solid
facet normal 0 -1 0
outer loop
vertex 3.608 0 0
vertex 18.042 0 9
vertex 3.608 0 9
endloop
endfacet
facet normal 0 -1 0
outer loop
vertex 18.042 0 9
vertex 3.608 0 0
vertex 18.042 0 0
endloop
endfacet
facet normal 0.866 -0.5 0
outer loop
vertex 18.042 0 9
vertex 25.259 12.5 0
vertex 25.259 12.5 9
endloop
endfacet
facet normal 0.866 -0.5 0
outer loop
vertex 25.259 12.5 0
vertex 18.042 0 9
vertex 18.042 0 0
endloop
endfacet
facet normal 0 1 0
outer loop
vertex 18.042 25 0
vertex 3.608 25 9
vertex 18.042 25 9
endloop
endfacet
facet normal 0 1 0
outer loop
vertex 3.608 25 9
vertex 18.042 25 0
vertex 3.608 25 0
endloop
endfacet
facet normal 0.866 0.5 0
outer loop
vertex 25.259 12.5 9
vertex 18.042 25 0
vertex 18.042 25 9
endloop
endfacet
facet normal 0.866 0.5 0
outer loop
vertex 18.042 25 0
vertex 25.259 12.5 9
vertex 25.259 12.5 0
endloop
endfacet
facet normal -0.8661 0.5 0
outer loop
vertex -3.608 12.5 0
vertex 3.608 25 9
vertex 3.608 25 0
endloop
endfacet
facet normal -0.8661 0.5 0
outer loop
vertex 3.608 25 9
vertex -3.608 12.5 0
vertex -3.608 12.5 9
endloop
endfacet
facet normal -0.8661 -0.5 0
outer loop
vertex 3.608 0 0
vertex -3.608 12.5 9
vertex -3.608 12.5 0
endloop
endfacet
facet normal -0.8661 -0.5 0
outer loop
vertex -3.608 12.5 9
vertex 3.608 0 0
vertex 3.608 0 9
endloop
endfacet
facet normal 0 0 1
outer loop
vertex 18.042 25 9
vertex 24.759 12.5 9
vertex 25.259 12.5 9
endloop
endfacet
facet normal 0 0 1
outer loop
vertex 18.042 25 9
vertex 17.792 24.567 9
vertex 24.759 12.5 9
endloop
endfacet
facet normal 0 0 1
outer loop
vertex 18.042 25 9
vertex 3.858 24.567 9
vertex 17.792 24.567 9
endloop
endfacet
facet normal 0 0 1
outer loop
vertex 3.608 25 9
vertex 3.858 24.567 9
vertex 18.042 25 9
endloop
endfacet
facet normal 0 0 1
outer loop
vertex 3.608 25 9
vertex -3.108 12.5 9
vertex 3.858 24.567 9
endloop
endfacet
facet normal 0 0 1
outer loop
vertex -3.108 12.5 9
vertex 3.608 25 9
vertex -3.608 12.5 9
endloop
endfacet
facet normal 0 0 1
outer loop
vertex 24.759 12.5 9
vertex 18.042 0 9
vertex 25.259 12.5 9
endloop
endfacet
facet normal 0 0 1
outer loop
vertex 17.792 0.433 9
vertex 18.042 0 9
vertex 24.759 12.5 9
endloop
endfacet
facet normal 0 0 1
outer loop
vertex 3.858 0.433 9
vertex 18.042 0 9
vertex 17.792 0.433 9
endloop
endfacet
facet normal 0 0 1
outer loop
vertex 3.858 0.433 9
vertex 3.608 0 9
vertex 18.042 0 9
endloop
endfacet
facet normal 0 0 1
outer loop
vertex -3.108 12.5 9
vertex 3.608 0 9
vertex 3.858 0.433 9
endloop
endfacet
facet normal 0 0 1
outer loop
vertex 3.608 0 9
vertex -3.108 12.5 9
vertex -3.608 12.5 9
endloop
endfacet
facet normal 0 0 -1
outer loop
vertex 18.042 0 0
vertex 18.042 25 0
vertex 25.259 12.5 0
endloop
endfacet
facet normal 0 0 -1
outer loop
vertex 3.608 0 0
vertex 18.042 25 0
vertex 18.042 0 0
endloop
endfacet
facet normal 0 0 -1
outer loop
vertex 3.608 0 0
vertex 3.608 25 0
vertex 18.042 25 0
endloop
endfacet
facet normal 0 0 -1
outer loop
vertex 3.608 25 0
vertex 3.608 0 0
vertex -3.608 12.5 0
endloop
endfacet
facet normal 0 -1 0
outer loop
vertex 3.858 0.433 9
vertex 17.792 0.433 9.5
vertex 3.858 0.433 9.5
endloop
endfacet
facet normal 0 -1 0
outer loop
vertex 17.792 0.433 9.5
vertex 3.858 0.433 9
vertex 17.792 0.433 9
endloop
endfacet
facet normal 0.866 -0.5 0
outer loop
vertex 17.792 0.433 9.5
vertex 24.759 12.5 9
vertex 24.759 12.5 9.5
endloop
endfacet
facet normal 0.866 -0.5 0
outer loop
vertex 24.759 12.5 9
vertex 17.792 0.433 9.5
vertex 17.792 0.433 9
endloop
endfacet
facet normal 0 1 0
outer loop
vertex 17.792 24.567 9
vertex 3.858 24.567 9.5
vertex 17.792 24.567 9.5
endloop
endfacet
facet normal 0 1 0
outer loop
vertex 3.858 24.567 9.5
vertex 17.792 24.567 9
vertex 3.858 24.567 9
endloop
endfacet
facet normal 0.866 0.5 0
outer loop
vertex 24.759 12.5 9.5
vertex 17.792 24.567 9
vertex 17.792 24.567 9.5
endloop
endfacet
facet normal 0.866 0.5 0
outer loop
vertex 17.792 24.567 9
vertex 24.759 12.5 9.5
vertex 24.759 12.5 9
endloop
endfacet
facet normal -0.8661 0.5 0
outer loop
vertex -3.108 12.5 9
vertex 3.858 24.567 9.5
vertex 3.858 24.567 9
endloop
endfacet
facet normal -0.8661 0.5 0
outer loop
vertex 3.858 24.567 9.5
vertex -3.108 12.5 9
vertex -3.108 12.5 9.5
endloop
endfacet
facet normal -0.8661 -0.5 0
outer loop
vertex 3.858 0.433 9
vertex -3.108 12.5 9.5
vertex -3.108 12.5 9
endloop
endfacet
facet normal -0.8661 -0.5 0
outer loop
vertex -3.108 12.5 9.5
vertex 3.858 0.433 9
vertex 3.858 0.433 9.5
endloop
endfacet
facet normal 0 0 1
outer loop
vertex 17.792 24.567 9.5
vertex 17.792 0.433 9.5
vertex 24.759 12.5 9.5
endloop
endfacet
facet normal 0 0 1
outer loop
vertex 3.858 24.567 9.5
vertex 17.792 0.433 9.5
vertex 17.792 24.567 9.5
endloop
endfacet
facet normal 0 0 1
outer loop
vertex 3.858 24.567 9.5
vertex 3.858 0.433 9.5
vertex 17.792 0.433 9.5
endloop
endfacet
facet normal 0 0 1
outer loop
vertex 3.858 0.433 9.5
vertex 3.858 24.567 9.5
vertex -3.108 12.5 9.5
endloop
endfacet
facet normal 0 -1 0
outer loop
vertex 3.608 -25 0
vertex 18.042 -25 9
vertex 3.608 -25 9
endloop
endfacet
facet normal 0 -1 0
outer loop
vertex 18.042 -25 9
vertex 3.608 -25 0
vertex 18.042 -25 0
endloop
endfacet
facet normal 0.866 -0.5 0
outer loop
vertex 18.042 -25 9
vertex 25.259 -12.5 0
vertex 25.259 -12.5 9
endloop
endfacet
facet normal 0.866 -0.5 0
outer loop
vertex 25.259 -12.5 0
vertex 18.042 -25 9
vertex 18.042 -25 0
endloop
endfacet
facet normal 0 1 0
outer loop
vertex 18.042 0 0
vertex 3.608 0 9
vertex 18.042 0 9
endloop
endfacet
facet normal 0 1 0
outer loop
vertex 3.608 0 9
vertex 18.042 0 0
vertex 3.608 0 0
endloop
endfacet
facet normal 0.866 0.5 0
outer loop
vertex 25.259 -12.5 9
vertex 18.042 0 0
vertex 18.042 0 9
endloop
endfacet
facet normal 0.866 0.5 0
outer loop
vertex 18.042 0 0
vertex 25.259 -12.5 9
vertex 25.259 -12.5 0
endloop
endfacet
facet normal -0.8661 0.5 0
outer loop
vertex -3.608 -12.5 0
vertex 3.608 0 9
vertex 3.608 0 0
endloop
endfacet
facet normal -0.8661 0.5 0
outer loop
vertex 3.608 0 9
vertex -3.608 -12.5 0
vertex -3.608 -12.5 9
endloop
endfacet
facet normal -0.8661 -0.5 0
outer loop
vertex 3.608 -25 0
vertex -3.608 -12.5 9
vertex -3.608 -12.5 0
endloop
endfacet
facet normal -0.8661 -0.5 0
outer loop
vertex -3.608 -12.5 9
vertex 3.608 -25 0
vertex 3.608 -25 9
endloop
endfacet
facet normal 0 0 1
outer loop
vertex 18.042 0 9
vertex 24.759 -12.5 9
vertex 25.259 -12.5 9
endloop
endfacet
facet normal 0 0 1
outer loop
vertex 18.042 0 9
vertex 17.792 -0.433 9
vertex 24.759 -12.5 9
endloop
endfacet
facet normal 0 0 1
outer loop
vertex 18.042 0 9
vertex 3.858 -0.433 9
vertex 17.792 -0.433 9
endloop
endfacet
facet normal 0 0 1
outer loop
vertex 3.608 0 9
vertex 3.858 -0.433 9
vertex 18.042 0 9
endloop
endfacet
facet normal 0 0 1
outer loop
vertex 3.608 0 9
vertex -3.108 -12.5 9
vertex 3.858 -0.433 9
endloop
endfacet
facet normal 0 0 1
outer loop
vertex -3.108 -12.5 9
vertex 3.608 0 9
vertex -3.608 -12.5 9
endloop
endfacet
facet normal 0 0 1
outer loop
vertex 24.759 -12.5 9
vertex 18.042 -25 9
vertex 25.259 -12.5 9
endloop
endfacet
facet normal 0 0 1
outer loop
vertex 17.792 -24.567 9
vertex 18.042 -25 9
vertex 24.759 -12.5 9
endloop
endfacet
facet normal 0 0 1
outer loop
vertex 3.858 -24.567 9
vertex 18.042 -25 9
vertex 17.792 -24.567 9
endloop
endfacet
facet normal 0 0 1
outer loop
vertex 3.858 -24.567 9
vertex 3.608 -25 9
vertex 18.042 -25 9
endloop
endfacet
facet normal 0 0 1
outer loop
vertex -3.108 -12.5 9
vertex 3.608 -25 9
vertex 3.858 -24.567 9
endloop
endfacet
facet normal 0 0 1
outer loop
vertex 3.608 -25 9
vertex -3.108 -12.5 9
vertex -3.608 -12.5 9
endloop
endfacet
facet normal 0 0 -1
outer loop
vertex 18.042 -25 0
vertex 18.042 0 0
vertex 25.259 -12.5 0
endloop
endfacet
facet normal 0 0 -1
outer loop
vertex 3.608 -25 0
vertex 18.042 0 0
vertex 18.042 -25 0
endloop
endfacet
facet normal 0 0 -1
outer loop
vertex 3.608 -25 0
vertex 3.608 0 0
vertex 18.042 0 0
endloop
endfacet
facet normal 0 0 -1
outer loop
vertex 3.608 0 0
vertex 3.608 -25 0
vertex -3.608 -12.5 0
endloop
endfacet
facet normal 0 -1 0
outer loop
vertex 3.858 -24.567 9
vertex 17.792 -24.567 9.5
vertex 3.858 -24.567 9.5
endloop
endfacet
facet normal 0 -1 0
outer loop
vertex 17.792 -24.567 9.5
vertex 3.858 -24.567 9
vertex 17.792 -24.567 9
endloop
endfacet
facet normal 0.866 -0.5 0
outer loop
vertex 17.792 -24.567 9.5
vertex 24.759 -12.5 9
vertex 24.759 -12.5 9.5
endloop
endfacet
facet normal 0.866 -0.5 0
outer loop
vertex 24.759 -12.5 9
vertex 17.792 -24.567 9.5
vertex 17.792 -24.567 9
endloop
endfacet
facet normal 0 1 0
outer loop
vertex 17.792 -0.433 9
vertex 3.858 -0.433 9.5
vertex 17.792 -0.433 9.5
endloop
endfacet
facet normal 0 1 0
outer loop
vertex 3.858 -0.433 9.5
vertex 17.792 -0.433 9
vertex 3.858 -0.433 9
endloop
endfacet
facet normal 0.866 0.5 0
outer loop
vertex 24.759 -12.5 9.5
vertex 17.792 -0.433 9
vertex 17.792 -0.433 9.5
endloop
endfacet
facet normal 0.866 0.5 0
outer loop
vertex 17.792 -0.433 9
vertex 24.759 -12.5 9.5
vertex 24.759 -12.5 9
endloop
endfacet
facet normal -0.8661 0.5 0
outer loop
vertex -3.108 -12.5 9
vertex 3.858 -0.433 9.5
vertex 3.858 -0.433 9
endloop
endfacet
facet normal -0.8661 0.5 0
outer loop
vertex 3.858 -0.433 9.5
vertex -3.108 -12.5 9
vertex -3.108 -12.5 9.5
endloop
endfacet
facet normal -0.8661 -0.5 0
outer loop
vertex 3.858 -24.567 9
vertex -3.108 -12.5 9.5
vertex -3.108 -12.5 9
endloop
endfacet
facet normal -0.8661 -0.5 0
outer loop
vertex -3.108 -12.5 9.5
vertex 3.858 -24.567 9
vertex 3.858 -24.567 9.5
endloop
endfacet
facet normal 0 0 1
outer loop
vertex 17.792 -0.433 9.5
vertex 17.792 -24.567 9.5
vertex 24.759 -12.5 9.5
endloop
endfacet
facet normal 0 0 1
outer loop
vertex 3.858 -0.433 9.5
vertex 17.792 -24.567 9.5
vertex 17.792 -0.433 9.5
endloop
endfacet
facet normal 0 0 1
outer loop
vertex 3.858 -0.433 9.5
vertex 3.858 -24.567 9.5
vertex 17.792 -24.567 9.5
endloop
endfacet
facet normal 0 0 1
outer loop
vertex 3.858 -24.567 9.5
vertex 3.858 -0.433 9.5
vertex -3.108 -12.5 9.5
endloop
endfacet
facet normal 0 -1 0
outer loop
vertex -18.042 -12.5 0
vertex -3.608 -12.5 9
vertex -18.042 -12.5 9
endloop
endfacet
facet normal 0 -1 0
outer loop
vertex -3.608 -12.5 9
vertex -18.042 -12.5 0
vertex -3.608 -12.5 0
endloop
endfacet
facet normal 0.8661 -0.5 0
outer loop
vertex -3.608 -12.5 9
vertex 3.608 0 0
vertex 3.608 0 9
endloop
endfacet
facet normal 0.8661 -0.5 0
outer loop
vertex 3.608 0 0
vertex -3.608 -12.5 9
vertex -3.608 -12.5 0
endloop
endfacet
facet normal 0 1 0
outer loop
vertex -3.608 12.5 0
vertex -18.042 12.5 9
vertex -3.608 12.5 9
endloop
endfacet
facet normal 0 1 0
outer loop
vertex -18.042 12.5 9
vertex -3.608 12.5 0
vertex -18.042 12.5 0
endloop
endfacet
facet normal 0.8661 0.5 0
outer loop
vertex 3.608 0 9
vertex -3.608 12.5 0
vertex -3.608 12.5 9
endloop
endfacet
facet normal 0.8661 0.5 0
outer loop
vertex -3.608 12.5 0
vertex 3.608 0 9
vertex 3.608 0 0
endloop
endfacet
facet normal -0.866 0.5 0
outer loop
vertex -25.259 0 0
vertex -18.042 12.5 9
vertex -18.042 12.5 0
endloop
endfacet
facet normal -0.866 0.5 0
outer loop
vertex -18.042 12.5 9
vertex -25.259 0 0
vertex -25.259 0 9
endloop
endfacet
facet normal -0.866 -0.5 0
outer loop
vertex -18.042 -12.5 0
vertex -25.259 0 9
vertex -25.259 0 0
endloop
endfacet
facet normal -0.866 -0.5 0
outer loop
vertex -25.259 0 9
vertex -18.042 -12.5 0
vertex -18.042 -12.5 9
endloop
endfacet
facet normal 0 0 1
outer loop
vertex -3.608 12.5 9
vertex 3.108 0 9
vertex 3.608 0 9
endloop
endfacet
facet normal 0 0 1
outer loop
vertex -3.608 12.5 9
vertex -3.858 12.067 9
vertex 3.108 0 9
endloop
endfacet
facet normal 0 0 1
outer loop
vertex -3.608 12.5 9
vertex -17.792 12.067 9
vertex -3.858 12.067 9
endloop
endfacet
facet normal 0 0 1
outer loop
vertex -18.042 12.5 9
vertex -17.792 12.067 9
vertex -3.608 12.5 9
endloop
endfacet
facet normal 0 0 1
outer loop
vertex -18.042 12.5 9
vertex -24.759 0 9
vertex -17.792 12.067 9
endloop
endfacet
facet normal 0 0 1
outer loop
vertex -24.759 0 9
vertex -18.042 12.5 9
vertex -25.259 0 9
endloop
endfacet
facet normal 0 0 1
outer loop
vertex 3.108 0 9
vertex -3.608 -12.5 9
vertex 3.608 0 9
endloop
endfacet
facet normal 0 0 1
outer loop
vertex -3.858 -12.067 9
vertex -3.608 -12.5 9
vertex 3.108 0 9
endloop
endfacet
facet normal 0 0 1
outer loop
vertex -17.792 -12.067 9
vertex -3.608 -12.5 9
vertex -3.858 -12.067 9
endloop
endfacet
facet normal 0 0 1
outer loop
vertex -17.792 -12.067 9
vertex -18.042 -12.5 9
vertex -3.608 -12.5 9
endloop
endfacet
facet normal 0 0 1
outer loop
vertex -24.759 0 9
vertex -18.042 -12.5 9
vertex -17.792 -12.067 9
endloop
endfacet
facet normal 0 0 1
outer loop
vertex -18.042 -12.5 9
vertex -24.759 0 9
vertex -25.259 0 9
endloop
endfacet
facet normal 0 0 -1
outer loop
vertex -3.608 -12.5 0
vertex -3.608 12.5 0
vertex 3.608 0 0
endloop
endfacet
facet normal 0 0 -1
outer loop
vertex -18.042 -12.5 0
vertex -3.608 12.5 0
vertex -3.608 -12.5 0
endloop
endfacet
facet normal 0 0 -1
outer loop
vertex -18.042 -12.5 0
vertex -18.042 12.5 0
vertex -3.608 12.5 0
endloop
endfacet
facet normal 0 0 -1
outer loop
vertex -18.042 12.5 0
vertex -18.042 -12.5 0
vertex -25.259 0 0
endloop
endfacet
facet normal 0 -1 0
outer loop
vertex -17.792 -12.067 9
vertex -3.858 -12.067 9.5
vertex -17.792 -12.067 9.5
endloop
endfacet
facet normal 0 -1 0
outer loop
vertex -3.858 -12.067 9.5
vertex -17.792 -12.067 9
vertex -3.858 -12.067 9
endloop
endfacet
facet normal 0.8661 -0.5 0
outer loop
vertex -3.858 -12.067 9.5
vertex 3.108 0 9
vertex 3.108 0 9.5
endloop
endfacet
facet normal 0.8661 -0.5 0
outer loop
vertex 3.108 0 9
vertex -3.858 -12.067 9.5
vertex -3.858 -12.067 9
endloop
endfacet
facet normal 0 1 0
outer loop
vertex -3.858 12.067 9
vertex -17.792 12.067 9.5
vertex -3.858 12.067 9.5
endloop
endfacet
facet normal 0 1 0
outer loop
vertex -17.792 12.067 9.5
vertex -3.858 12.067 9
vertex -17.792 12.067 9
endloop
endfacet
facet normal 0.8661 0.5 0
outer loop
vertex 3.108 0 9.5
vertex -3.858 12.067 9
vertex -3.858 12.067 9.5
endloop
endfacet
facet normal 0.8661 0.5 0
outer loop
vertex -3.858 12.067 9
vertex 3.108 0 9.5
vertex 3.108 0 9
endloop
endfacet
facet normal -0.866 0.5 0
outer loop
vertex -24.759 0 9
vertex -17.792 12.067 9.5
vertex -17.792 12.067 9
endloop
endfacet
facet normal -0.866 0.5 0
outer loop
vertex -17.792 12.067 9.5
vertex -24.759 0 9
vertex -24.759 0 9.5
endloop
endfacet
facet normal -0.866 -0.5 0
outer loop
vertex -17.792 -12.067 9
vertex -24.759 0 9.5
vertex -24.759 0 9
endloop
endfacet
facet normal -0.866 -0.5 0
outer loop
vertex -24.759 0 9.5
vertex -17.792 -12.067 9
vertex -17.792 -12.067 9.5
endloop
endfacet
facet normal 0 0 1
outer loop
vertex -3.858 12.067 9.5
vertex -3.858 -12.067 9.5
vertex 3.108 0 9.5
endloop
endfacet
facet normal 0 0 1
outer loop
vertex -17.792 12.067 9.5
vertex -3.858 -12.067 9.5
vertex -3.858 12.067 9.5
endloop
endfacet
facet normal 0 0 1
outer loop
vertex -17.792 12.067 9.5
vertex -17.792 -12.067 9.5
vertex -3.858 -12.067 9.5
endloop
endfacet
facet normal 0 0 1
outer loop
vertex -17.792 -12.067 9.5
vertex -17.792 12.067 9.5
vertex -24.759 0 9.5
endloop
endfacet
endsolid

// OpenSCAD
apothem = 25 / 2;
diagonal = apothem * 2.3094;
halfDiagonal = diagonal / 2;
point = halfDiagonal * 0.25;
flat = halfDiagonal - point;
sideTranslation = halfDiagonal + point*2;

module single(h = 10){
    cylinder(h -1, d = diagonal, $fn = 6); // mother hexagon
    translate([0, 0, h -1]) cylinder(0.5, d = diagonal - 1, $fn = 6);
}

module double(h = 10){
    translate([ 0, apothem, 0]) single(h);
    translate([ 0, -apothem, 0]) single(h);
}

module triple(h = 10){
    translate([halfDiagonal - point, 0, 0]) double(h);
    translate([-flat, 0, 0]) single(h);
}

module triCurve(h = 10){
    translate([0,apothem, 0]) single(h);
    translate([sideTranslation, 0, 0]) single(h);
    translate([-sideTranslation, 0, 0]) single(h);
}

module quadCurve(h = 10){
    translate([0, apothem, 0]) triCurve(h);
    translate([-sideTranslation, -apothem, 0]) single(h);
}

module quintuple(h = 10){
    translate([0, 0, 0]) quadCurve(h);
    translate([0, 0, 0]) single(h);
}

module quintCurve(h = 10){
    translate([0, 0, 0]) quadCurve(h);
    translate([0, -apothem*2, 0]) single(h);
}

module fullCurve(h = 10){
    translate([0, 0, 0]) quintCurve(h);
    translate([sideTranslation, -apothem, 0]) single(h);
}

module fullBig(h = 10){
    translate([0, 0, 0]) fullCurve(h);
    translate([0, 0, 0]) single(h);
}

translate([65 * 0, 0, 0]) triple();
// translate([65 * 1, 0, 0]) double();
// translate([65 * 2, 0, 0]) triple();
// translate([65 * 3, 0, 0]) quintuple();
// translate([65 * 4, 0, 0]) fullBig();

// translate([65 * 0, 70, 0]) triCurve();
// translate([65 * 1, 70, 0]) quadCurve();
// translate([65 * 2, 70, 0]) quintCurve();
// translate([65 * 3, 70, 0]) fullCurve();
